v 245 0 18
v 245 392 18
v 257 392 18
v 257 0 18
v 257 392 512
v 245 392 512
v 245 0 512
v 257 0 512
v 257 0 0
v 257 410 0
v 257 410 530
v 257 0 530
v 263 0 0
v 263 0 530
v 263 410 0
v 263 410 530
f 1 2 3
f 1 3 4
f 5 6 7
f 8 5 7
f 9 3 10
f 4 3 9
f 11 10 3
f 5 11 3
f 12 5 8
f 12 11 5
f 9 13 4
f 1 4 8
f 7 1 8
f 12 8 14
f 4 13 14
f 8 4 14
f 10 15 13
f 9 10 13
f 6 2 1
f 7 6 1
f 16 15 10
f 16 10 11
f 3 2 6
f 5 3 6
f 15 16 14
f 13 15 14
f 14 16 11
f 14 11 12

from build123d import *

# Parameters (mm, degrees)
SKETCH056_W             = 410
SKETCH056_H             = 530
PAD021_DEPTH            = 18
SKETCH057_W             = 410
SKETCH057_H             = 18
POCKET034_DEPTH         = 12
SKETCH058_W             = 18
SKETCH058_H             = 530
POCKET035_DEPTH         = 12
BODY020_ROLL_ANGLE      = 90
BODY020_PLACEMENT_ANGLE = -90


with BuildPart() as part:
    # Sketch056 → Pad021 (new body)
    with BuildSketch(Plane.XY):
        with Locations((0, 265)):
            Rectangle(SKETCH056_W, SKETCH056_H)
    extrude(amount=PAD021_DEPTH)

    # Sketch057 (on Face6 of Pad021) → Pocket034 (cut)
    with BuildSketch(Plane.XY.offset(18)):
        with Locations((0, 9)):
            Rectangle(SKETCH057_W, SKETCH057_H)
        with Locations((0, 521)):
            Rectangle(SKETCH057_W, SKETCH057_H)
    extrude(amount=-POCKET034_DEPTH, mode=Mode.SUBTRACT)

    # Sketch058 (on Face9 of Pocket034) → Pocket035 (cut)
    with BuildSketch(Plane.XY.offset(18)):
        with Locations((-196, 265)):
            Rectangle(SKETCH058_W, SKETCH058_H)
    extrude(amount=-POCKET035_DEPTH, mode=Mode.SUBTRACT)


with BuildPart() as part_1:
    # Body020 roll: moved
    add(part.part.rotate(Axis((0, 0, 0), (1, 0, 0)), BODY020_ROLL_ANGLE))


with BuildPart() as part_2:
    # Body020 placement: moved
    add(part_1.part.moved(Location((263, 205, 0))).rotate(Axis((263, 205, 0), (0, 0, 1)), BODY020_PLACEMENT_ANGLE))


solid = part_2.part
